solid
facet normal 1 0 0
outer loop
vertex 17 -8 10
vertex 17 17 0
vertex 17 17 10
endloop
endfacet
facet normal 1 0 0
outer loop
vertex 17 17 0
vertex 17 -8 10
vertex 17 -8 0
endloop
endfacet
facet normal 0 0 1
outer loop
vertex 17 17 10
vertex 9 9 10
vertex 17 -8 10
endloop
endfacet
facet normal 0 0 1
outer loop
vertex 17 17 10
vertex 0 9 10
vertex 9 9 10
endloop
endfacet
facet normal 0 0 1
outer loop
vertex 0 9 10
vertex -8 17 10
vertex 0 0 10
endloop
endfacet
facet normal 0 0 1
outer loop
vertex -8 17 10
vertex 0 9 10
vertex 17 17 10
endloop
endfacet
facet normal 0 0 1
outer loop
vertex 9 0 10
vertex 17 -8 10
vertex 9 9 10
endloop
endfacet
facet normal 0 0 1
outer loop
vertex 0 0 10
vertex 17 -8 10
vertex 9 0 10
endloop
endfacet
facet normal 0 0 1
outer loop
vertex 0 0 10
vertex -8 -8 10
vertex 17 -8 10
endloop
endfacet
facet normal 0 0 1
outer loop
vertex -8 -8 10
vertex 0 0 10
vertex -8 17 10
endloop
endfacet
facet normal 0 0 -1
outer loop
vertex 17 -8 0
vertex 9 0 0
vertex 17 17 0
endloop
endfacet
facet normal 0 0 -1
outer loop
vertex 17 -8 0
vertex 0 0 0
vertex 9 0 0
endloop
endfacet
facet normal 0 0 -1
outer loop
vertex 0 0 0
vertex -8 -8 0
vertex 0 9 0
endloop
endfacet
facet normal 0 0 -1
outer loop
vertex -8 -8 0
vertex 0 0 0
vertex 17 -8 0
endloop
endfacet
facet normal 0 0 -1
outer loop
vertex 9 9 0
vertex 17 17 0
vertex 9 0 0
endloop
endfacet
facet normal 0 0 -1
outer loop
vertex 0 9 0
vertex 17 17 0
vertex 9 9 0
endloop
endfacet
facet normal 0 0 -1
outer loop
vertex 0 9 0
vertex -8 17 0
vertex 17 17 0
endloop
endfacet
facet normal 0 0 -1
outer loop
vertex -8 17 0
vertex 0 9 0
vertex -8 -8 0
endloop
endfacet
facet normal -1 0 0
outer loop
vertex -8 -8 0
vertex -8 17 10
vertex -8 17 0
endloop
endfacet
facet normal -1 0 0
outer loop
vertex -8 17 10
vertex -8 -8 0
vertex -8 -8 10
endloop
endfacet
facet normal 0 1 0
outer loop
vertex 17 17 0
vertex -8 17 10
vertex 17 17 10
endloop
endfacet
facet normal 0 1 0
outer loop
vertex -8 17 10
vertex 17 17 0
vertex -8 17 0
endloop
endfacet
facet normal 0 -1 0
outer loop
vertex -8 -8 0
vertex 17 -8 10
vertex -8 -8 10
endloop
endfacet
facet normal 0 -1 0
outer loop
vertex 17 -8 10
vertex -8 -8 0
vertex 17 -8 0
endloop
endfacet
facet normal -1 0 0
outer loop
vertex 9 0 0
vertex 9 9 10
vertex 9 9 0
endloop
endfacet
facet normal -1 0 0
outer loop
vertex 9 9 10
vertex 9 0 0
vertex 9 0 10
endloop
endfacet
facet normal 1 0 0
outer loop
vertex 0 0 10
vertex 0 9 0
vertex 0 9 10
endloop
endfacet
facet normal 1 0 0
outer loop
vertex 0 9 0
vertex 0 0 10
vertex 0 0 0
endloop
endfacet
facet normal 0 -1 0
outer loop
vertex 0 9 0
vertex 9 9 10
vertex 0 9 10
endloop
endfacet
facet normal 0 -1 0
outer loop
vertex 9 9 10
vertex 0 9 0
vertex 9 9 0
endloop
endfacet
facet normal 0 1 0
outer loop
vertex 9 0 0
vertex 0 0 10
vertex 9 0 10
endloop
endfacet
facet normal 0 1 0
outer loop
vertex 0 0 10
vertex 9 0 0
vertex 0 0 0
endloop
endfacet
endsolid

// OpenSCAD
//Pflock Breite Tiefe
p=8;
//Pflock Höhe
hp=68;
//Latte 600 10 5
lh=10;
//Latte Dicke
ld=5;
//Latte Länge
ll=600;
//Lattenhöhe + Kulanz für Abstand
lhk=lh+3;
//Spielraum für Basis (nur in basisonly() verwenden)
sr=1;

show_basis=false;

module basis()
{
  translate([-p,-p,0])
  cube([p*3+sr,p*3+sr,lh]);
}

module pflock()
{
  if (show_basis)
  basis();
  cube([p+sr,p+sr,hp]);
}

module latte()
{  
  cube([ll,ld,lh]);
}

module pflock_vorne_links()
{
pflock();
}

module pflock_vorne_rechts()
{
//Pflock vorne rechts
translate([ll-p,0,0])
pflock();
}

module pflock_hinten_rechts()
{
//Pflock hinten rechts
translate([ll-p,ll-p,0])
pflock();
}

module pflock_hinten_links()
{
//Pflock hinten links
translate([0,ll-p,0])
pflock();
}

module latten_vorne()
{
//Latten vorne
//unten
translate([0,-ld/2,lhk*2])
latte();
//oben
translate([0,-ld/2,lhk*4])
latte();
}

module latten_links()
{
//Latten links
//unten
translate([ld/2,0,lhk])
rotate([0,0,90])
latte();
//oben
translate([ld/2,0,lhk*3])
rotate([0,0,90])
latte();
}

module latten_rechts()
{
//Latten rechts
//unten
translate([ld/2+ll,0,lhk])
rotate([0,0,90])
latte();
//oben
translate([ld/2+ll,0,lhk*3])
rotate([0,0,90])
latte();
}

module latten_hinten()
{
//Latten hinten
//unten
translate([0,-ld/2+ll,lhk*2])
latte();
//oben
translate([0,-ld/2+ll,lhk*4])
latte();
}

module gesamt()
{
pflock_vorne_links();
pflock_vorne_rechts();
pflock_hinten_links();
pflock_hinten_rechts();

latten_vorne();
latten_hinten();
latten_links();
latten_rechts();
}

//gesamt();

module pflock_vorne_links_raw()
{
    difference()
    {
        pflock_vorne_links();
        latten_vorne();
        latten_links();
    }
}

//pflock_vorne_links_raw();

module pflock_vorne_rechts_raw()
{
    difference()
    {
        pflock_vorne_rechts();
        latten_vorne();
        latten_rechts();
    }
}

//pflock_vorne_rechts_raw();

module pflock_vorne_raw()
{
    difference()
    {
        pflock_vorne_links();
        latten_vorne();
    }
}

//pflock_vorne_raw();

module pflock_links_raw()
{
    difference()
    {
        pflock_vorne_links();
        latten_links();
    }
}

//pflock_links_raw();

module basisonly()
{
    difference()
    {
        basis();
        pflock();
    }
}

basisonly();
